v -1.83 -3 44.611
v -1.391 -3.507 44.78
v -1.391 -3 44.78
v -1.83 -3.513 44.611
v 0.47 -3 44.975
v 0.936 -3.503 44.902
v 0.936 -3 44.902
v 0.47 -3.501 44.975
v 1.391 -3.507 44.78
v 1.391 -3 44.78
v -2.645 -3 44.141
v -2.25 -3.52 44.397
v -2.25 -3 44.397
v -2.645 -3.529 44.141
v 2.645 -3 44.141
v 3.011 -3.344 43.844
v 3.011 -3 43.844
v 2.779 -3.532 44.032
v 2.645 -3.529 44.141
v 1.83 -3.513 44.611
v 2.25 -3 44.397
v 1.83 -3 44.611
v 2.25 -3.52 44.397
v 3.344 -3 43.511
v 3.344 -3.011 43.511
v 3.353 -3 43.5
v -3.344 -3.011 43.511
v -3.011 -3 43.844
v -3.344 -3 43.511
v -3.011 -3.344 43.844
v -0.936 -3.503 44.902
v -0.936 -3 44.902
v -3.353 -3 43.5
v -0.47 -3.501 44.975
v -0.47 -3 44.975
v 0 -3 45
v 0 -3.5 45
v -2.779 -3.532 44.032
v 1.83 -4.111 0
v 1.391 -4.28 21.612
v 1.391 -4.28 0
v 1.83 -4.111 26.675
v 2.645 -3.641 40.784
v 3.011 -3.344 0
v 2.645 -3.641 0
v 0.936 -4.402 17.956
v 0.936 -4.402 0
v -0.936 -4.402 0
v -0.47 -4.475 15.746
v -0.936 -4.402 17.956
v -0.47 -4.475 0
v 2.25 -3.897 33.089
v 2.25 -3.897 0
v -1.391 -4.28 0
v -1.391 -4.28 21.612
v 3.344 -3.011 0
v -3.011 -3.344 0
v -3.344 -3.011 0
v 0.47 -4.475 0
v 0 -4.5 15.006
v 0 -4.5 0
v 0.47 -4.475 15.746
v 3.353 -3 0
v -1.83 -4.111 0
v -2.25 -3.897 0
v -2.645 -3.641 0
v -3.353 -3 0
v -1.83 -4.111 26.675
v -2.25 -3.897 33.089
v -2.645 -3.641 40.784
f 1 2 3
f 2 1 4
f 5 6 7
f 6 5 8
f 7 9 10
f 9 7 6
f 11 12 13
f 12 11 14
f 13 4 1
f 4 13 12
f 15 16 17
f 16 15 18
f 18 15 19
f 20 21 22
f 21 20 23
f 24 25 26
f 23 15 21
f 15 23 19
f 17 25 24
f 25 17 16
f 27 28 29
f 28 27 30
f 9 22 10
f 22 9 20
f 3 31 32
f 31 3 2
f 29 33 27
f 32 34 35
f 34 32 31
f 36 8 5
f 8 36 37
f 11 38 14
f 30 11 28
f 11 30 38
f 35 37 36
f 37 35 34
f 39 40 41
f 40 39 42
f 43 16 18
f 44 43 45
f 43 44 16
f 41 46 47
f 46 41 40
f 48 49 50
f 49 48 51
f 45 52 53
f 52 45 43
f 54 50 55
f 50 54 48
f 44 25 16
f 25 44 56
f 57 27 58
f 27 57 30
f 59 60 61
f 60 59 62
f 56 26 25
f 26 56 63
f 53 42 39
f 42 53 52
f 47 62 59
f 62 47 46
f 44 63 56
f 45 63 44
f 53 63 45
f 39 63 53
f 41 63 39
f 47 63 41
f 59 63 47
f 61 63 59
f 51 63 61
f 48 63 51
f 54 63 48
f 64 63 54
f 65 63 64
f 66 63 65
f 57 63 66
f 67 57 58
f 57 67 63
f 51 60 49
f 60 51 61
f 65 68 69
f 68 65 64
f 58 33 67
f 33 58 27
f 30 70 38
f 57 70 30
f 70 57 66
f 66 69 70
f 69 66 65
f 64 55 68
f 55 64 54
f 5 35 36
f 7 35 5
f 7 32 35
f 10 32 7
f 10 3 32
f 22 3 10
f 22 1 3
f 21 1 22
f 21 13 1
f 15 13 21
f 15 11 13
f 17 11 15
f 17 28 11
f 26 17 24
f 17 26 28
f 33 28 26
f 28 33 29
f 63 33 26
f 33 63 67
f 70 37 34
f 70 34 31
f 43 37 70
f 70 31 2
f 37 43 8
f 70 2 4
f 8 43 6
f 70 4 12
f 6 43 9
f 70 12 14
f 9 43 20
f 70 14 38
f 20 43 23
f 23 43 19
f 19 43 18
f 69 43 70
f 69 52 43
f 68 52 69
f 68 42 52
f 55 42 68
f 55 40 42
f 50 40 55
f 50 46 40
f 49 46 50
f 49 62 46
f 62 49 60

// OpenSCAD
// file: ../../common.scad
// Make circles circular in final renders.
$fn = $preview ? 0 : 60;

// clearance in a permanent tenon/mortise joint
clearance = 0.04;

module brass() {
  color("gold") children();
}

module derlin() {
  color("dimgray") children();
}

// tube creates a hollow cylinder
module tube(h=10, id=5, od=10) {
  difference() {
    cylinder(h=h, d=od);
    cylinder(h=h, d=id);
  }
}

// default height of rings
rings_height = 1.8;

// rings of adornment.
// This engraves two rings, 1.4mm apart, at a depth of 0.4.
module rings(h=0.4, d=1, depth=0.4, spacing=1.4) {
  tube(h=h, id=d-depth, od=d);
  translate([0, 0, spacing]) tube(h=h, id=d-depth, od=d);
}

// default brass tube thickness
brass_thickness = 0.75;

// brass_tube creates a chamfered hollow cylinder with given inside diameter,
// and wall thickness of 0.75.
// Decorative rings are etched into the top and bottom.
module brass_tube(h=10, id=10, t=brass_thickness) {
  od = id + (t*2);
  cd = (id + od) / 2; // Chamfer diameter

  brass() {
    difference() {
      tube(h=h, id=id, od=od);

      // Chamfered ends
      translate([0, 0, 0]) cylinder(h=1, d1=cd, d2=id);
      translate([0, 0, h-1]) cylinder(h=1, d1=id, d2=cd);

      translate([0, 0, 2]) rings(d=od);
      translate([0, 0, h-2-rings_height]) rings(d=od);
    }
  }
}

// brass_bend provides a 180 degree bend in brass
module brass_bend(od=12.7, bend_r=16, t=brass_thickness) {
  color("gold") {
    rotate([90, 0, 0]) {
      rotate_extrude(angle=180) {
        translate([bend_r, 0, 0]) {
          difference() {
            circle(d=od);
            circle(d=od-t*2);
          }
        }
      }
    }
  }
}


// derlin_tube is a non-chamfered sky blue tube.
// I use blue so it's easier to see in preview.
module derlin_tube(h=10, id=5, od=10) {
  derlin() {
    tube(h=h, id=id, od=od);
  }
}

// derlin_stop is a derlin tube, chamfered on one end.
module derlin_stop(h=10, id=5, od=10) {
  chamferh = h/5;
  derlin() {
    difference() {
      union() {
        cylinder(h=h-chamferh, d=od);
        translate([0, 0, h-chamferh]) cylinder(h=chamferh, d1=od, d2=id);
        }
      cylinder(h=h, d=id);
      }
    }
}

// default bell height
bell_height = 17;

// derlin_bell makes a decorative flared bell.
// od will default to 33% larger than id.
module derlin_bell(h=bell_height, id=5, od=0) {
  chamferh = 1;
  chamferd = 1;
  ringsmargin = 1;
  toph = rings_height + ringsmargin*2 + chamferh;
  flareh = h - toph;
  od = (od == 0) ? (id * 1.33) : od;
  derlin() {
    difference() {
      union() {
        cylinder(h=flareh, d1=id, d2=od);
        translate([0, 0, flareh]) cylinder(h=toph-chamferh, d=od);
        translate([0, 0, flareh+toph-chamferh]) cylinder(h=chamferh, d1=od, d2=od-chamferd);
      }
      cylinder(h=h, d=id);
      translate([0, 0, flareh + ringsmargin]) rings(d=od);
    }
  }
}
// main file
include <../../common.scad>

// 9mm od
// 7.5mm from plane on reed holder to back
// 9 - 7.5 = 2.5 thickness; 4.5-2.5=2 cutaway from center

length = 45;
thickness = 0.5;
d = 9;
base_thickness = 1.5;

scrape_angle = atan((base_thickness-thickness)/length)*1.5;

module reed_chopper(d) {
  difference() {
    translate([-d/2, 0, 0]) cube([d, d/2, d]);
    cylinder(d=d, h=d);
  }
}

difference() {
  cylinder(d=d, h=length);
  translate([-5, -d/2+base_thickness, 0]) cube([10, 10, length*2]);
  translate([-5, -d/2+base_thickness-thickness, length]) rotate([-scrape_angle, 180, 180]) cube([10, 10, 50]);
  translate([0, 0, length-d/2]) rotate([90, 0, 0]) reed_chopper(d);
}
